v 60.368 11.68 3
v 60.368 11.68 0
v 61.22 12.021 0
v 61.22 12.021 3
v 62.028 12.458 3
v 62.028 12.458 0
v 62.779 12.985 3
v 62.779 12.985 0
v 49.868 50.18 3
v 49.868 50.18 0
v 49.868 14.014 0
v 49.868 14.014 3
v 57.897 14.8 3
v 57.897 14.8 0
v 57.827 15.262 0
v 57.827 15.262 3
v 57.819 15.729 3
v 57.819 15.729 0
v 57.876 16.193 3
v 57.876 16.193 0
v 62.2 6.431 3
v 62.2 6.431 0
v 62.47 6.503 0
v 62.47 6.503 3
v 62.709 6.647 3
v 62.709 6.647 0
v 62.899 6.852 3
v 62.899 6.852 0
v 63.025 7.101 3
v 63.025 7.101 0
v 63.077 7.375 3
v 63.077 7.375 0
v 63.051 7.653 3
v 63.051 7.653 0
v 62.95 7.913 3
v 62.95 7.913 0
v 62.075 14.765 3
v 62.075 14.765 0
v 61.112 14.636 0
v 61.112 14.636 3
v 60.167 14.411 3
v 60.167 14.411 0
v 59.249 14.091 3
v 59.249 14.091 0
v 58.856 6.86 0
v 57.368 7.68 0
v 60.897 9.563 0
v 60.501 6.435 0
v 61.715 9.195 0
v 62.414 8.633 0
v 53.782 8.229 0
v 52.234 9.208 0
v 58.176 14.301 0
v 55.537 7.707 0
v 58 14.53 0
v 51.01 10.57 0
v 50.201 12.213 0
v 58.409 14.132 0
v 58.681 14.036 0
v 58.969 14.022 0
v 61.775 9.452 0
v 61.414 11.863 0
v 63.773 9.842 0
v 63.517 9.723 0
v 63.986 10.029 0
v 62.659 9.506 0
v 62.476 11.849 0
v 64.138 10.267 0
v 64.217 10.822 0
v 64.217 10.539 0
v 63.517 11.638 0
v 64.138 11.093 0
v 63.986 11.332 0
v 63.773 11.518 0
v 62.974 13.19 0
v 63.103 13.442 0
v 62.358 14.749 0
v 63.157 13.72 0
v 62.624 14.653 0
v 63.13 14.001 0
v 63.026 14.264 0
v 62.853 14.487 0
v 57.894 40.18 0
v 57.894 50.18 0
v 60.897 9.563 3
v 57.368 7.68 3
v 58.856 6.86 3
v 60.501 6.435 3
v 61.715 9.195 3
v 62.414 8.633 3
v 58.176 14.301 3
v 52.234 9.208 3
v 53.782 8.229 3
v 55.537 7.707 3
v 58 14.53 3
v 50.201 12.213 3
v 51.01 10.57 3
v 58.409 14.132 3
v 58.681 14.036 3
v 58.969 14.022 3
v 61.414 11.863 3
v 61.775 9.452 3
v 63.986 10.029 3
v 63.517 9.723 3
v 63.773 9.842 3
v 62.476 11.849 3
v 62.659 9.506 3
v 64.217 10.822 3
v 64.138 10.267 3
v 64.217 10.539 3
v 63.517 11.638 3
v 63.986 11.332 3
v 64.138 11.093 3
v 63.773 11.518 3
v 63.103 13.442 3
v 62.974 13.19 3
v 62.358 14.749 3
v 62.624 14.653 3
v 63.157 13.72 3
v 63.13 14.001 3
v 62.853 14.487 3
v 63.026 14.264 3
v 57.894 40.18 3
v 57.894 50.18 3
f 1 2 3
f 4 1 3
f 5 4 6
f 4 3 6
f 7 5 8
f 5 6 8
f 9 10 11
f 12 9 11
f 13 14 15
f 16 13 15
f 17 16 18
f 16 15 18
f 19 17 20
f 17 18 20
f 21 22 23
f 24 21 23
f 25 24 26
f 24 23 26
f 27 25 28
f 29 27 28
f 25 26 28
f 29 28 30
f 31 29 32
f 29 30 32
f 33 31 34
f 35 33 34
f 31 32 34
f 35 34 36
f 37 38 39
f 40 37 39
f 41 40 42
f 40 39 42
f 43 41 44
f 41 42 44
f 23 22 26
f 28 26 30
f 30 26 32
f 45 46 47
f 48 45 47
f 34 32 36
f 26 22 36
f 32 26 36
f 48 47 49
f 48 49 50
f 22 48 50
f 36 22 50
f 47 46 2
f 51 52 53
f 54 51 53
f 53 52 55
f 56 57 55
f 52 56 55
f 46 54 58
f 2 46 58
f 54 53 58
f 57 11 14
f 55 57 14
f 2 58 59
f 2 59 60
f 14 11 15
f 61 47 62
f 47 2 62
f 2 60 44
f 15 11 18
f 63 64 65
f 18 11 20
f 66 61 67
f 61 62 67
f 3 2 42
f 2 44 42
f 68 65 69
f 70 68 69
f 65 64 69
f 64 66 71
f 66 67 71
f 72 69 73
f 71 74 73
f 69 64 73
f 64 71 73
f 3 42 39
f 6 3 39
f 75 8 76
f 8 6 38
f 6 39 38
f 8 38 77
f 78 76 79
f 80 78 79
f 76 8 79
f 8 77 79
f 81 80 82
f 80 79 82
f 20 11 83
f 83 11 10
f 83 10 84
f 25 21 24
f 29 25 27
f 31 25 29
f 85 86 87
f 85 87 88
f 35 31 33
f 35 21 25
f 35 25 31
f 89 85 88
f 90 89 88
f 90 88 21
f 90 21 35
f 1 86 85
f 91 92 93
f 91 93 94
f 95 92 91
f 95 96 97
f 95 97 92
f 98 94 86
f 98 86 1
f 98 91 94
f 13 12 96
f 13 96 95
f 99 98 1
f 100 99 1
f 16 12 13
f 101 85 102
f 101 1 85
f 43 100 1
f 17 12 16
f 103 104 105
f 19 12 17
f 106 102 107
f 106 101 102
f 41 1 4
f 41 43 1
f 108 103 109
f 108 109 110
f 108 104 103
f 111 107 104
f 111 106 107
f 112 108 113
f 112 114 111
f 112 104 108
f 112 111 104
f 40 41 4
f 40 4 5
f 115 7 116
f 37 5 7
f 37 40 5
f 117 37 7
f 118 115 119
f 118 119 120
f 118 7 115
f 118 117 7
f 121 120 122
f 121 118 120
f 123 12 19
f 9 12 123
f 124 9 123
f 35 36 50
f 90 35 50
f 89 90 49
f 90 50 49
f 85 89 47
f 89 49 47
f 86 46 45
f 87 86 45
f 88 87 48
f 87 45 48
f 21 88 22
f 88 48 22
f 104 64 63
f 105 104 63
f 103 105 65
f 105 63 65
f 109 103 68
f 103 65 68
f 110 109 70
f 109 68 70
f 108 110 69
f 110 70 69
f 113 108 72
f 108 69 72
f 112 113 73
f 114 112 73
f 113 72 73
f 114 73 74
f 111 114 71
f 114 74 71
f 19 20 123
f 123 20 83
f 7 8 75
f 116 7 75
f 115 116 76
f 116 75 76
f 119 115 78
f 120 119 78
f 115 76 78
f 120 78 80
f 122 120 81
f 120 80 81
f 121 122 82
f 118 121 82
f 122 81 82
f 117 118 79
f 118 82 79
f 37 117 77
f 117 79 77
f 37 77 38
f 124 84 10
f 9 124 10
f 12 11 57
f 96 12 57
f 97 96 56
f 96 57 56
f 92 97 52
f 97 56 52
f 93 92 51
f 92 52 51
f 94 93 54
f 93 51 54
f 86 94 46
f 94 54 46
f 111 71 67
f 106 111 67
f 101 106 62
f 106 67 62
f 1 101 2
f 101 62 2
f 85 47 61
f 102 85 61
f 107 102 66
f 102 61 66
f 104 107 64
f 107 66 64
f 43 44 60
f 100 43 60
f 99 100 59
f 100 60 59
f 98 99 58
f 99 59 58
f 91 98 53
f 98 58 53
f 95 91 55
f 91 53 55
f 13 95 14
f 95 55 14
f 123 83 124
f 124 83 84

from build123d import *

# Parameters (mm, degrees)
SALIENTE_EXTRUIR1_DEPTH = 3


with BuildPart() as part:
    # Model → Saliente-Extruir1 (new body)
    with BuildSketch(Plane.XY):
        with BuildLine():
            Line((57.876051331, 16.193461244), (57.893981077, 40.180349578))
            Line((57.893981077, 40.180349578), (57.893981077, 50.180349578))
            Line((57.893981077, 50.180349578), (49.867941077, 50.180349578))
            Line((49.867941077, 50.180349578), (49.867941077, 31.597099578))
            Line((49.867941077, 31.597099578), (49.867941077, 14.013849578))
            ThreePointArc((49.867941077, 14.013849578), (52.233805345, 9.208034607), (57.367941077, 7.680349578))
            ThreePointArc((57.367941077, 7.680349578), (59.6653644, 6.596184281), (62.200359504, 6.430751104))
            ThreePointArc((62.200359504, 6.430751104), (62.9704791, 6.972225641), (62.949576341, 7.913417408))
            ThreePointArc((62.949576341, 7.913417408), (62.082712456, 8.936213823), (60.897352842, 9.562702519))
            ThreePointArc((60.897352842, 9.562702519), (62.218292049, 9.458452731), (63.516644878, 9.723081417))
            ThreePointArc((63.516644878, 9.723081417), (64.2274431, 10.680349578), (63.516644878, 11.637617739))
            ThreePointArc((63.516644878, 11.637617739), (61.945301969, 11.880701786), (60.367941077, 11.680349578))
            ThreePointArc((60.367941077, 11.680349578), (61.630469791, 12.22740936), (62.779023795, 12.985087958))
            ThreePointArc((62.779023795, 12.985087958), (63.087813038, 14.136299223), (62.075412289, 14.765332526))
            ThreePointArc((62.075412289, 14.765332526), (60.636782457, 14.535665244), (59.249346326, 14.091341219))
            ThreePointArc((59.249346326, 14.091341219), (58.409082944, 14.132037192), (57.897205789, 14.799630249))
            ThreePointArc((57.897205789, 14.799630249), (57.815004717, 15.495458697), (57.876051331, 16.193461244))
        make_face()
    extrude(amount=SALIENTE_EXTRUIR1_DEPTH)


solid = part.part
